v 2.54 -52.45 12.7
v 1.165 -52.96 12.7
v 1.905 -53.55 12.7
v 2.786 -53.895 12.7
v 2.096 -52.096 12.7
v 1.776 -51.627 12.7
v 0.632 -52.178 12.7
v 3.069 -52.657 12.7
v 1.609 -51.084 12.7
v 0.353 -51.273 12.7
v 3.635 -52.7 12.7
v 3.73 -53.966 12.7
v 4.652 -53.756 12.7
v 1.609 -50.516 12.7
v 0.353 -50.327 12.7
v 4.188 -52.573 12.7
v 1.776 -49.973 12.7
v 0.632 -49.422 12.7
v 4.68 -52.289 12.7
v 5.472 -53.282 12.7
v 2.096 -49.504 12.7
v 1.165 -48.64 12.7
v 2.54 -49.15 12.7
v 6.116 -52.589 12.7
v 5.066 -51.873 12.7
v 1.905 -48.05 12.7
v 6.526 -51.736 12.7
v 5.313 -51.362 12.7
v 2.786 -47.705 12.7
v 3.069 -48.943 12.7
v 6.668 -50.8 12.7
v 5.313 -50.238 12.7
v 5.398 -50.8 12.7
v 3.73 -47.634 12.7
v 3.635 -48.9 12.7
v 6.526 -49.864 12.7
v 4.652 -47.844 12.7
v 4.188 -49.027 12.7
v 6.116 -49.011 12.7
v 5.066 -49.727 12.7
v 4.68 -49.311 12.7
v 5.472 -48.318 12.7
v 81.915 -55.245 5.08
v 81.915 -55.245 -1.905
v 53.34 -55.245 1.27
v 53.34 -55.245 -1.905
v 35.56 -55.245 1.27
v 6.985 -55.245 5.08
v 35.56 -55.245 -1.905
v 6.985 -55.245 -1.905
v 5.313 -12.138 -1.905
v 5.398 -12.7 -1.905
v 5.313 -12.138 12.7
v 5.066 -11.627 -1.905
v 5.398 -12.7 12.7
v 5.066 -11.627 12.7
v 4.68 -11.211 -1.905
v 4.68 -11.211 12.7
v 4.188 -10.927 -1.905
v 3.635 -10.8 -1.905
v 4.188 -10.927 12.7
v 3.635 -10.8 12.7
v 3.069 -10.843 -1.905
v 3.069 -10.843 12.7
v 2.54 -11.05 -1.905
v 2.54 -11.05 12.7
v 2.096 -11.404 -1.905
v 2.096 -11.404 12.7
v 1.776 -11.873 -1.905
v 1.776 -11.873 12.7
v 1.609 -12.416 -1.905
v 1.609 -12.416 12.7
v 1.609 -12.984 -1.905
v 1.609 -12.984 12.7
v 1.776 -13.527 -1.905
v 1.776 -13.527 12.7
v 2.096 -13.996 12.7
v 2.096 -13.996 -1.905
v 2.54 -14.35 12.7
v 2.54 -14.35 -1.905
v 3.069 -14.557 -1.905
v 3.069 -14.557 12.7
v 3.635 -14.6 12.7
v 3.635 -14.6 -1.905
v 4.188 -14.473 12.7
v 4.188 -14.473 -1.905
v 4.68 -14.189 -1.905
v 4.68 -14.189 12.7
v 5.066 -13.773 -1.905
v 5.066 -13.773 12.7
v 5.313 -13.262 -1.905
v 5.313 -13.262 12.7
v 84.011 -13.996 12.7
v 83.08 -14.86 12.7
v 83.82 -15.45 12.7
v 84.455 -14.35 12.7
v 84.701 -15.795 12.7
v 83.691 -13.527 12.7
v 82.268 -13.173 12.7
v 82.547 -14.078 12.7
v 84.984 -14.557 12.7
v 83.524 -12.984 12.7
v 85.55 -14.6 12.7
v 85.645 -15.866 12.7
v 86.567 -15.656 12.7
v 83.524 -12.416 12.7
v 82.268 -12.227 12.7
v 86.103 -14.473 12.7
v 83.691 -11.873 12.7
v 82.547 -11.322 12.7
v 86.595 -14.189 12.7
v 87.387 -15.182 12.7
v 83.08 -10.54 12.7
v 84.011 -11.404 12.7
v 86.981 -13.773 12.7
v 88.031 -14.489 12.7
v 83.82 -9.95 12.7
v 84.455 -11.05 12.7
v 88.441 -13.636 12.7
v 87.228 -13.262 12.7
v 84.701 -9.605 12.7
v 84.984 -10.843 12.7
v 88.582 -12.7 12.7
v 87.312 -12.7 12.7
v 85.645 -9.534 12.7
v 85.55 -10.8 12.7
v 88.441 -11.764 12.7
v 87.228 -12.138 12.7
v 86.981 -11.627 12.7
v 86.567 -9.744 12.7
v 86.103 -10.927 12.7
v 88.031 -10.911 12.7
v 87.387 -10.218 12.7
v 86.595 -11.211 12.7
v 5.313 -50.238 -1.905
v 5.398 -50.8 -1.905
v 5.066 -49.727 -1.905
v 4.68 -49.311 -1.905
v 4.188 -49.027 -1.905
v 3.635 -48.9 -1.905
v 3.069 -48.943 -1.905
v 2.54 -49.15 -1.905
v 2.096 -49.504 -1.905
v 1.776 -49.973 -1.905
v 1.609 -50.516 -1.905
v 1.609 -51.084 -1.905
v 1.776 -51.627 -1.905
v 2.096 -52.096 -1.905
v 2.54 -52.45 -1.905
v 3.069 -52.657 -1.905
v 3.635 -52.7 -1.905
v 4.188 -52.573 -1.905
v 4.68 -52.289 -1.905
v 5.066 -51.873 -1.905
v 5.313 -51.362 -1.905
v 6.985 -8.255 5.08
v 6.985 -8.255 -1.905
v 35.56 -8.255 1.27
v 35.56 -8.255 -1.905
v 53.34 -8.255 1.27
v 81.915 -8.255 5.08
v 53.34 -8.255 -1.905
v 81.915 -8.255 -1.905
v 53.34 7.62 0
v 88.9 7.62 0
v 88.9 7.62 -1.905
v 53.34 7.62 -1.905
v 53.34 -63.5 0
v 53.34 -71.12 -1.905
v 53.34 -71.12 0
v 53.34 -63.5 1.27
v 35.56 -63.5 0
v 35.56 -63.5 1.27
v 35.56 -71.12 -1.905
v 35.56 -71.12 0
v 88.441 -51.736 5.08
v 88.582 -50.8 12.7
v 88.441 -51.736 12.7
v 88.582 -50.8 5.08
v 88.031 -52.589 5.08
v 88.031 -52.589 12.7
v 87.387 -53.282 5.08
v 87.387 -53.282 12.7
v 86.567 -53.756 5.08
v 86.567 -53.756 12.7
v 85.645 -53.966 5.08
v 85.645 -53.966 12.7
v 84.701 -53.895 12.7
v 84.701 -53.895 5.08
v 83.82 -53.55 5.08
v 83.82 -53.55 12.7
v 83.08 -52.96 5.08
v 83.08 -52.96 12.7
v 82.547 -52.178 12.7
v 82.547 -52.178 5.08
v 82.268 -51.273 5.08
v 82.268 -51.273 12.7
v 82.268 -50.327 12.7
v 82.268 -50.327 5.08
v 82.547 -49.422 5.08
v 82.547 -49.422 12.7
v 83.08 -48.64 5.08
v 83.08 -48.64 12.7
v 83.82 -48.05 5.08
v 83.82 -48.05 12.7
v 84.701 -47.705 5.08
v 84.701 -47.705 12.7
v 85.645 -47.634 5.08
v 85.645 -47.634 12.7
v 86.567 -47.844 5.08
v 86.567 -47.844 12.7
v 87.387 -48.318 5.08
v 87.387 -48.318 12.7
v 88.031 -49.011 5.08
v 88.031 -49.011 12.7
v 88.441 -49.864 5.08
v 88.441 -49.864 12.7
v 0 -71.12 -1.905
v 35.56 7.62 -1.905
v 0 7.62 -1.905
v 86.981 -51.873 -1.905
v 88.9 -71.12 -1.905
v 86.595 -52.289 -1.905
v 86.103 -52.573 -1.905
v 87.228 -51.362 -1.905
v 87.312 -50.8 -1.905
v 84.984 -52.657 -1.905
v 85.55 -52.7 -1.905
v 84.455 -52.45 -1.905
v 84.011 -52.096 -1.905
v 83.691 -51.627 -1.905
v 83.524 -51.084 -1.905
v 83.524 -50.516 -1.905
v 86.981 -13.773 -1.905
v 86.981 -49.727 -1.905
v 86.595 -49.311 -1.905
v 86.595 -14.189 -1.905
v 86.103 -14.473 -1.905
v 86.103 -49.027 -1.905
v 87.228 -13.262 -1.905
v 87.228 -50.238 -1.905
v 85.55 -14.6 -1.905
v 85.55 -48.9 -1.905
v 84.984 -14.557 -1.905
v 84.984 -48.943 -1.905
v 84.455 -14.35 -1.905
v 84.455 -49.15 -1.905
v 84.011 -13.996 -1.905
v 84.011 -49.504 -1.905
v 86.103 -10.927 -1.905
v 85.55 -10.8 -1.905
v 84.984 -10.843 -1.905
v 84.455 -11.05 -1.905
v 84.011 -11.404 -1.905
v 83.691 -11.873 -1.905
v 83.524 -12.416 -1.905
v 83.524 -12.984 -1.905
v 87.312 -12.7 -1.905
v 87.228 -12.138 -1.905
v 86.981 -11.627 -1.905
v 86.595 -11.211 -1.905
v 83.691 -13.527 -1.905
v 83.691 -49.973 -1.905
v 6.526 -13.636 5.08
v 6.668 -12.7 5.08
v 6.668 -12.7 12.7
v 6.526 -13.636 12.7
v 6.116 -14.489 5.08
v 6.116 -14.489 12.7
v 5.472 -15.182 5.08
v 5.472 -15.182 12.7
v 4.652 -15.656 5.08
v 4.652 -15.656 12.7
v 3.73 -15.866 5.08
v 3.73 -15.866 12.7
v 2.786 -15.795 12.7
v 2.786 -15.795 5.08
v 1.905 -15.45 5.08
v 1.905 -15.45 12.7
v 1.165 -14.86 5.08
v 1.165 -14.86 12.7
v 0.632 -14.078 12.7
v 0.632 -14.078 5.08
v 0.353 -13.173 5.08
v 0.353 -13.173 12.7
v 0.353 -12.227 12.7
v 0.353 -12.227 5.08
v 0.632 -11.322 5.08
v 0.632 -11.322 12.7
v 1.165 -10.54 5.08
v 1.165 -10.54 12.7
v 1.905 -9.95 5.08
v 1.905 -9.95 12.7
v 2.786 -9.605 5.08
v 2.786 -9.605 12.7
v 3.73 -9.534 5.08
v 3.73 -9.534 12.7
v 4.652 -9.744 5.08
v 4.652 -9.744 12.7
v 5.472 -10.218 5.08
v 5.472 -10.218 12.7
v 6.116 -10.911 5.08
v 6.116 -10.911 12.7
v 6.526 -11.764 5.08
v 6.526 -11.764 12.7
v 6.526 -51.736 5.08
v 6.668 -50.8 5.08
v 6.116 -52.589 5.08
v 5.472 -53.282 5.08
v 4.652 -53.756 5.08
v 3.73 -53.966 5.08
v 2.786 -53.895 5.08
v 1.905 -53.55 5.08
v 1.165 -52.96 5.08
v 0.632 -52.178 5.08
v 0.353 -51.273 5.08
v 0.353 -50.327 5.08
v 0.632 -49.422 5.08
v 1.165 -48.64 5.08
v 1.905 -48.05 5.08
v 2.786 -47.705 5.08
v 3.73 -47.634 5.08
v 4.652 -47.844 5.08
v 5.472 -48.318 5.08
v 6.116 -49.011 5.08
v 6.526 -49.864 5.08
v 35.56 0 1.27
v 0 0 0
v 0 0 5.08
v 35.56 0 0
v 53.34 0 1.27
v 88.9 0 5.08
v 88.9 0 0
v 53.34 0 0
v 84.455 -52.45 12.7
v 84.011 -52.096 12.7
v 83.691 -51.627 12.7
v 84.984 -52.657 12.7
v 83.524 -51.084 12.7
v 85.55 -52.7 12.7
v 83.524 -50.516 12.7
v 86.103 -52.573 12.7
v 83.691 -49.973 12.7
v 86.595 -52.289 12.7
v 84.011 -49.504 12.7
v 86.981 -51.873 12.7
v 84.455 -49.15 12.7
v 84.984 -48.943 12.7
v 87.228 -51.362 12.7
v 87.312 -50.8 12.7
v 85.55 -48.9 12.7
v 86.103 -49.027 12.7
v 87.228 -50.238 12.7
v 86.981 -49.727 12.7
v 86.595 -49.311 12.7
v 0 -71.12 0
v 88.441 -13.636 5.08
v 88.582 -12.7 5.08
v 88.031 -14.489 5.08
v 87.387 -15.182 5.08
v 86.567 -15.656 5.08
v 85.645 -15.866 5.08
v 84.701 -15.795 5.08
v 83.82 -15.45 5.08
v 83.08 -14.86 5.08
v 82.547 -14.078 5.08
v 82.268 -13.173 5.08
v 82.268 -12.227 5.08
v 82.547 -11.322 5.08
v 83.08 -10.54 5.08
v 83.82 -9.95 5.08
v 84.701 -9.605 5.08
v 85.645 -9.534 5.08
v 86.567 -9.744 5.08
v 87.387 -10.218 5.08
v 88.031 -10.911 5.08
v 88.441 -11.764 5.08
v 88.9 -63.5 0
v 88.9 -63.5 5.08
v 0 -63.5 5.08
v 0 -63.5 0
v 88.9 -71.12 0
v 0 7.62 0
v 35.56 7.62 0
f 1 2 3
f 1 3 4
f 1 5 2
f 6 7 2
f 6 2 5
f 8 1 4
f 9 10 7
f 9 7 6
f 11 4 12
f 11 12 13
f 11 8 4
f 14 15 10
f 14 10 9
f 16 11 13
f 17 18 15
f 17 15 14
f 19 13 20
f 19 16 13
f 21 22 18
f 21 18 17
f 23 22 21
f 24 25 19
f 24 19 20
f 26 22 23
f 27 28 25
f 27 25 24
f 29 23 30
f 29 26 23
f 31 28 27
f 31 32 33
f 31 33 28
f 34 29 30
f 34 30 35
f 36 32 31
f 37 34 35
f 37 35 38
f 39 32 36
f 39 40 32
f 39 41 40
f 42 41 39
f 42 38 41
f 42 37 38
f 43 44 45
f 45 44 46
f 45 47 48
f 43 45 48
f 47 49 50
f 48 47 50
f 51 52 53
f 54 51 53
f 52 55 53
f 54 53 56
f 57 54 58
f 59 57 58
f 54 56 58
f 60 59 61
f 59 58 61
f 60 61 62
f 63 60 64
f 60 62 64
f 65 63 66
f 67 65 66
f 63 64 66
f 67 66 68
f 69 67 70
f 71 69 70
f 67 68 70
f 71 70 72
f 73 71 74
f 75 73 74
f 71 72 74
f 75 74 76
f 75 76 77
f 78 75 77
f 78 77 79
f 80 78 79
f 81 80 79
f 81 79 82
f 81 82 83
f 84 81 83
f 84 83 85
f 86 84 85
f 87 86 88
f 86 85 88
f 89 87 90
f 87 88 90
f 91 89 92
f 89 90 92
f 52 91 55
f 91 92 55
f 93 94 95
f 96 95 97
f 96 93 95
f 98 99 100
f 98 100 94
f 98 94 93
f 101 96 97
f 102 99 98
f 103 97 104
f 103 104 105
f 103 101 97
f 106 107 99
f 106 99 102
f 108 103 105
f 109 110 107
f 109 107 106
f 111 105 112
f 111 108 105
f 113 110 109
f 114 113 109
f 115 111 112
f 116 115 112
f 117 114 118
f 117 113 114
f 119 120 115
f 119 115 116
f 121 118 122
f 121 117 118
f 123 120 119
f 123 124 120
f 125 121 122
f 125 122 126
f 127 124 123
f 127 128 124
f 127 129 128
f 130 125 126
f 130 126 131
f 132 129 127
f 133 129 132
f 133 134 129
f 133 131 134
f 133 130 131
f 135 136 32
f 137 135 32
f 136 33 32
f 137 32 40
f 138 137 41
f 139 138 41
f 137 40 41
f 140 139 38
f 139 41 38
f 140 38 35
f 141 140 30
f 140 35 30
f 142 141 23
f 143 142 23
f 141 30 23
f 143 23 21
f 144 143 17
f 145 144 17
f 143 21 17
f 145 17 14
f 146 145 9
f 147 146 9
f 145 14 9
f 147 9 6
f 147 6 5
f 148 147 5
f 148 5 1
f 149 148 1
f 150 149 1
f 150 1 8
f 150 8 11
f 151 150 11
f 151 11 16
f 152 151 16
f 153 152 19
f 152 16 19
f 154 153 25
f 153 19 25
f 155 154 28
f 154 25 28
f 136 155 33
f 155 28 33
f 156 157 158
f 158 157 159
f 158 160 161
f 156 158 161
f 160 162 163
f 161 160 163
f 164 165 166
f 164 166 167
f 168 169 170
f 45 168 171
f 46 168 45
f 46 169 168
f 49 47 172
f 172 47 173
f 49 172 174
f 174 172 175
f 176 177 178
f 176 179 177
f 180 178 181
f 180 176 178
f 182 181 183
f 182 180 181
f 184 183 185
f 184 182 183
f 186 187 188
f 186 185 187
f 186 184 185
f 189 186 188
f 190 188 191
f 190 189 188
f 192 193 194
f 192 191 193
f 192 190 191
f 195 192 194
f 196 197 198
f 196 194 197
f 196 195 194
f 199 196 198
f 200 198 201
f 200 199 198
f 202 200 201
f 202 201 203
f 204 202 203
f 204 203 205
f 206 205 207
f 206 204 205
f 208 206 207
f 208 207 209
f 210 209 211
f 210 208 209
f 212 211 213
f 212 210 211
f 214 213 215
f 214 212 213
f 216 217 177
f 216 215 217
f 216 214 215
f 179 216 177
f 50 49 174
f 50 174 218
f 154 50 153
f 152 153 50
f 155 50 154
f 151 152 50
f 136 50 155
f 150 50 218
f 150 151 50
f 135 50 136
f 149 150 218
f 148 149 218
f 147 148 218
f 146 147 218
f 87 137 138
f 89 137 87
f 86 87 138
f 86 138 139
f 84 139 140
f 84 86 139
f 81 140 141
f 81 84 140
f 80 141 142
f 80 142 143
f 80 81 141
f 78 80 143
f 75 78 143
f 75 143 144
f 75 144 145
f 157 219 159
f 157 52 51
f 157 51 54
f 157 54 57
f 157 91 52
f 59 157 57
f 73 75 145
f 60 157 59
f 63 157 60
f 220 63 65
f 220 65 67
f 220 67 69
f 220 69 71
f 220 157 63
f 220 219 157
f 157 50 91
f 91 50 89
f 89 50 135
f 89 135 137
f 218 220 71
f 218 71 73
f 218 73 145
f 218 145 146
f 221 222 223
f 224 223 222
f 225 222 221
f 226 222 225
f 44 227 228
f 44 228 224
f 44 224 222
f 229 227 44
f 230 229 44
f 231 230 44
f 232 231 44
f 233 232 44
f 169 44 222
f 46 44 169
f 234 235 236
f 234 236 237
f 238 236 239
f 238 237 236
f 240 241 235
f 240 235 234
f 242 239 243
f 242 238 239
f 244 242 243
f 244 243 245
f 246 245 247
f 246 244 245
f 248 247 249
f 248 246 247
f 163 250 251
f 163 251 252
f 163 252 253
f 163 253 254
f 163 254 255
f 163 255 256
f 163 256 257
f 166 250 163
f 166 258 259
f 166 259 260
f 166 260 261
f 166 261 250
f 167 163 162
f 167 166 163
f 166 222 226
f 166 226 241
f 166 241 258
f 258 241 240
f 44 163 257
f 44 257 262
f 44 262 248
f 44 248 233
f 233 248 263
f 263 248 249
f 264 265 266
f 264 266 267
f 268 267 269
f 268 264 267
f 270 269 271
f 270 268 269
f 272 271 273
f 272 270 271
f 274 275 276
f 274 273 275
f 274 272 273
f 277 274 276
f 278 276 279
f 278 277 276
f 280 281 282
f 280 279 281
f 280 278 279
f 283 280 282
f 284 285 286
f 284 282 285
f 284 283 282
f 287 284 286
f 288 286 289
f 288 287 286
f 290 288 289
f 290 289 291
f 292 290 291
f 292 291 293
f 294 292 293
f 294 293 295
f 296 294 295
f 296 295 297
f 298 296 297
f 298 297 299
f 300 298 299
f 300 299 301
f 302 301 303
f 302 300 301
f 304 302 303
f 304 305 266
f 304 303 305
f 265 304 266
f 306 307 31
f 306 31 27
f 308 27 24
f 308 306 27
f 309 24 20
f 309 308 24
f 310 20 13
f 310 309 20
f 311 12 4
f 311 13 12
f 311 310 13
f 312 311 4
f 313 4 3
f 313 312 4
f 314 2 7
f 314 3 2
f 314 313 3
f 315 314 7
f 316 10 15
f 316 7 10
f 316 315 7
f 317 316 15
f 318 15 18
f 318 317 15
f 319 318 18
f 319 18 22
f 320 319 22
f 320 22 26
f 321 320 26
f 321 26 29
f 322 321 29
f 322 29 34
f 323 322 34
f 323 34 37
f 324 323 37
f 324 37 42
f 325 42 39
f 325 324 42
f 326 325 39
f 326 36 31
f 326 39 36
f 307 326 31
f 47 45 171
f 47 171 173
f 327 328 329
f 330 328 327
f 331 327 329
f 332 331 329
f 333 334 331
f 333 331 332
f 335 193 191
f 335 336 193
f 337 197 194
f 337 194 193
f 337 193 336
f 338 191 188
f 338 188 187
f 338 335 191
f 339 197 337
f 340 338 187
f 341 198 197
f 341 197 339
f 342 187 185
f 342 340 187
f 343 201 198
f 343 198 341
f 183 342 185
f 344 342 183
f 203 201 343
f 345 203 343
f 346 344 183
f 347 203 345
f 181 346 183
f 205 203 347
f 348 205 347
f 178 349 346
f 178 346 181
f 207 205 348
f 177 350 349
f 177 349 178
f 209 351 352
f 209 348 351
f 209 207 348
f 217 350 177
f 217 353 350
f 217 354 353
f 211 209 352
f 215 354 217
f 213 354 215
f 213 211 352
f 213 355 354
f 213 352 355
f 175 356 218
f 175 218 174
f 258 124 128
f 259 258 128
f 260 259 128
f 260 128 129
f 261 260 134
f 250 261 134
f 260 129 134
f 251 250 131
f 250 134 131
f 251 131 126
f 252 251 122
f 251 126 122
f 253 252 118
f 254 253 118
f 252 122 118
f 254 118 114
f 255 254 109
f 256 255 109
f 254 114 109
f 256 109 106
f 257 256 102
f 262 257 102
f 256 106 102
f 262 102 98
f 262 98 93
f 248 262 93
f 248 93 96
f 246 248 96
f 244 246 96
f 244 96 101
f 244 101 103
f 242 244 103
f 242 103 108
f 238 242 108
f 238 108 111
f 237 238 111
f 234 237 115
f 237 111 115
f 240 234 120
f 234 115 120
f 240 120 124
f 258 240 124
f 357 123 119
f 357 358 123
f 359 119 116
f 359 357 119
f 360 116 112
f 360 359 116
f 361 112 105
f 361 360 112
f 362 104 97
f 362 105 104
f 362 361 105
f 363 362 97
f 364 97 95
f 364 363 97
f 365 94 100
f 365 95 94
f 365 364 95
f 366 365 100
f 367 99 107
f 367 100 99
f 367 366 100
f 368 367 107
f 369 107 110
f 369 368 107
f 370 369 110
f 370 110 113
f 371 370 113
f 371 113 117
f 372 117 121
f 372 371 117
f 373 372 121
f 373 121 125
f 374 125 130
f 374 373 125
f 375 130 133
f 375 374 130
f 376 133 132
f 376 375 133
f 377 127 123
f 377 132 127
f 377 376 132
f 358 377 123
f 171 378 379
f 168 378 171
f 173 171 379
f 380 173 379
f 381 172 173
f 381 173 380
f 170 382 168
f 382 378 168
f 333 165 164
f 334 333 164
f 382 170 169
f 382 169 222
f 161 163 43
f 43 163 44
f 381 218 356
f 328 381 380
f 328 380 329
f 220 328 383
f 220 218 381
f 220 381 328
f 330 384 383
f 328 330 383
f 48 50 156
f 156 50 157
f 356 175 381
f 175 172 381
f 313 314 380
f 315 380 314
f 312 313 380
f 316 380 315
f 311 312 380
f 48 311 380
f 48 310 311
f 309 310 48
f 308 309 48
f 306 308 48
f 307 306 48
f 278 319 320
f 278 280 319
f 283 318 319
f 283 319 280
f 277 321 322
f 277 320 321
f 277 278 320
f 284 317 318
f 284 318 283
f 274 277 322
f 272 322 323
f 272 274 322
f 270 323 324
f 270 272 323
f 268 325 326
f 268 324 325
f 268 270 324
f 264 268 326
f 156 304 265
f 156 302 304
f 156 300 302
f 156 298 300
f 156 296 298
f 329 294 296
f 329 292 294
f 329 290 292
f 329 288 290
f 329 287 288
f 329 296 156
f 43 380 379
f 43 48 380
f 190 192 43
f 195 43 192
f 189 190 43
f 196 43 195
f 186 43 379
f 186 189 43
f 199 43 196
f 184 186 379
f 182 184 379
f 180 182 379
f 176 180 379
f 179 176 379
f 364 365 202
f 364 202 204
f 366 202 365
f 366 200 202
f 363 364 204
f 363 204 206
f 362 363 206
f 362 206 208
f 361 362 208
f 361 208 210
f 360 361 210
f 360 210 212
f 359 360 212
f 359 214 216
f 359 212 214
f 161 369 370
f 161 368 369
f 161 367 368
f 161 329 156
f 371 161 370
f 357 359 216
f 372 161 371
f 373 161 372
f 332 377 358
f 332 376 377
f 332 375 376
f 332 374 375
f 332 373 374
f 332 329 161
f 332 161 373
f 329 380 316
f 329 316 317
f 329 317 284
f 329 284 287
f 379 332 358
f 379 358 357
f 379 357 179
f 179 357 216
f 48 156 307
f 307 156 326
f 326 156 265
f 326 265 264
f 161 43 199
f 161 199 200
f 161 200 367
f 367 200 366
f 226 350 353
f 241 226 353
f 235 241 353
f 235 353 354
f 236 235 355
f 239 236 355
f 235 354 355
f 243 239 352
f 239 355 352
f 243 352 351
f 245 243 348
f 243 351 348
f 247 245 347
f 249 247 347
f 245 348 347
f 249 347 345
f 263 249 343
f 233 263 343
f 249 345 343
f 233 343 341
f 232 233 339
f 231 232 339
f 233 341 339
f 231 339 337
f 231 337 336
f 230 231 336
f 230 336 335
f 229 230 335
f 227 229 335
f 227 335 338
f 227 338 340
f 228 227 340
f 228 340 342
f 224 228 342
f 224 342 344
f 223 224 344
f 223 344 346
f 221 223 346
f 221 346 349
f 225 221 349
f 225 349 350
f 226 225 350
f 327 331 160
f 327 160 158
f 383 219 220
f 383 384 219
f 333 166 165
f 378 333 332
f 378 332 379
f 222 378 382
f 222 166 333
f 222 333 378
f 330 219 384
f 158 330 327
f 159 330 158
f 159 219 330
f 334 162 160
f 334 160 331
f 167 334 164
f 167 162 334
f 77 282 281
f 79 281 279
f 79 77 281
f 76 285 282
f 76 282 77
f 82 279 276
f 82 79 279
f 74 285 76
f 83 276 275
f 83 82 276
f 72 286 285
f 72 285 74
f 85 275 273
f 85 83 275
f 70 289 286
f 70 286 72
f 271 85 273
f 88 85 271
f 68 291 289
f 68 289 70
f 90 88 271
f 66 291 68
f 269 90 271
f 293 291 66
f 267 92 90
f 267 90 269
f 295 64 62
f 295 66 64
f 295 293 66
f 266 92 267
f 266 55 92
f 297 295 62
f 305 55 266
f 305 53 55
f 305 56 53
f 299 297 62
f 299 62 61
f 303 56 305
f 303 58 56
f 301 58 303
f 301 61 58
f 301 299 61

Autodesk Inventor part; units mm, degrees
ref_plane "YZ Plane" through (0, 0, 0) normal (1, 0, 0) x (0, 1, 0)
ref_plane "XZ Plane" through (0, 0, 0) normal (0, 1, 0) x (-1, 0, 0)
ref_plane "XY Plane" through (0, 0, 0) normal (0, 0, 1) x (1, 0, 0)
sketch "Sketch1" plane through (0, 0, 0) normal (0, 0, 1) x (1, 0, 0)
  line L0 (0, 0) -> (88.9, 0)
  line L1 (88.9, 0) -> (88.9, -63.5)
  line L2 (88.9, -63.5) -> (0, -63.5)
  line L3 (0, -63.5) -> (0, 0)
  line L4 (6.985, -8.255) -> (81.915, -8.255)
  line L5 (81.915, -8.255) -> (81.915, -55.245)
  line L6 (81.915, -55.245) -> (6.985, -55.245)
  line L7 (6.985, -55.245) -> (6.985, -8.255)
  dimension "d0" = 88.9
  dimension "d1" = 63.5
  dimension "d2" = 8.255
  dimension "d3" = 8.255
  dimension "d4" = 6.985
  dimension "d5" = 6.985
extrude "Extrusion1" add sketch "Sketch1" along normal blind 5.08
sketch "Sketch2" plane through (0, 0, 5.08) normal (0, 0, 1) x (1, 0, 0)
  circle A0 centre (3.4925, -12.7) radius 3.175
  circle A1 centre (3.4925, -50.8) radius 3.175
  circle A2 centre (85.4075, -50.8) radius 3.175
  circle A3 centre (85.4075, -12.7) radius 3.175
  line L0 (88.9, 0) -> (0, 0) projected
  line L1 (0, -63.5) -> (88.9, -63.5) projected
  line L2 (0, 0) -> (0, -63.5) projected
  line L3 (81.915, -8.255) -> (81.915, -55.245) projected
  circle A4 centre (85.4075, -50.8) radius 1.905
  circle A5 centre (85.4075, -12.7) radius 1.905
  circle A6 centre (3.4925, -50.8) radius 1.905
  circle A7 centre (3.4925, -12.7) radius 1.905
  dimension "d8" = 6.35
  dimension "d9" = 6.35
  dimension "d10" = 6.35
  dimension "d11" = 6.35
  dimension "d12" = 12.7
  dimension "d13" = 12.7
  dimension "d14" = 12.7
  dimension "d15" = 12.7
  dimension "d16" = 3.4925
  dimension "d17" = 3.4925
  dimension "d18" = 3.81
extrude "Extrusion2" add sketch "Sketch2" along normal blind 7.62
sketch "Sketch3" plane through (0, 0, 0) normal (0, 0, -1) x (-1, 0, 0)
  line L0 (0, 7.62) -> (0, -71.12)
  line L1 (-88.9, -71.12) -> (-88.9, 7.62)
  line L2 (0, 0) -> (-88.9, 0) projected
  line L3 (-88.9, -63.5) -> (0, -63.5) projected
  line L4 (-88.9, 0) -> (-88.9, -63.5) projected
  line L5 (0, -63.5) -> (0, 0) projected
  line L6 (-35.56, 0) -> (-35.56, 7.62)
  line L7 (-53.34, 7.62) -> (-53.34, 0)
  line L8 (0, -63.5) -> (-88.9, -63.5) projected
  line L9 (-53.34, -63.5) -> (-53.34, -71.12)
  line L10 (-35.56, -63.5) -> (-35.56, -71.12)
  line L11 (-88.9, 7.62) -> (-53.34, 7.62)
  line L12 (-35.56, 7.62) -> (0, 7.62)
  line L13 (0, -71.12) -> (-35.56, -71.12)
  line L14 (-53.34, -71.12) -> (-88.9, -71.12)
  point P0 (-88.9, -31.75)
  point P1 (0, -31.75)
  dimension "d23" = 35.56
  dimension "d24" = 35.56
extrude "Extrusion3" add sketch "Sketch3" along normal blind 1.905
sketch "Sketch4" plane through (0, 0, 0) normal (0, 0, 1) x (1, 0, 0)
  line L0 (6.985, -8.255) -> (81.915, -8.255)
  line L1 (81.915, -8.255) -> (81.915, -55.245)
  line L2 (81.915, -55.245) -> (6.985, -55.245)
  line L3 (6.985, -55.245) -> (6.985, -8.255)
  point P0 (0, 0)
extrude "Extrusion4" cut sketch "Sketch4" against normal blind 1.905
sketch "Sketch5" plane through (0, 0, -1.905) normal (0, 0, -1) x (-1, 0, 0)
  line L0 (0, -63.5) -> (-88.9, -63.5) projected
  line L1 (-53.34, 0) -> (-35.56, 0)
  line L2 (-35.56, 0) -> (-35.56, -63.5)
  line L3 (-35.56, -63.5) -> (-53.34, -63.5)
  line L4 (-53.34, -63.5) -> (-53.34, 0)
  point P0 (0, 0)
  dimension "d29" = 17.78
extrude "Extrusion5" cut sketch "Sketch5" against normal blind 3.175
sketch "Sketch6" plane through (85.4075, -12.7, 12.7) normal (0, 0, 1) x (1, 0, 0)
  circle A0 centre (0, 0) radius 1.905
  circle A1 centre (-81.915, 0) radius 1.905 projected
  circle A2 centre (-81.915, 0) radius 1.905
  circle A3 centre (0, -38.1) radius 1.905 projected
  circle A4 centre (0, -38.1) radius 1.905
  circle A5 centre (-81.915, -38.1) radius 1.905 projected
  circle A6 centre (-81.915, -38.1) radius 1.905
  point P0 (-85.4075, 12.7)
extrude "Extrusion6" cut sketch "Sketch6" against normal blind 25.4
properties part number "Heatsink al base" material "Aluminum 6061"
